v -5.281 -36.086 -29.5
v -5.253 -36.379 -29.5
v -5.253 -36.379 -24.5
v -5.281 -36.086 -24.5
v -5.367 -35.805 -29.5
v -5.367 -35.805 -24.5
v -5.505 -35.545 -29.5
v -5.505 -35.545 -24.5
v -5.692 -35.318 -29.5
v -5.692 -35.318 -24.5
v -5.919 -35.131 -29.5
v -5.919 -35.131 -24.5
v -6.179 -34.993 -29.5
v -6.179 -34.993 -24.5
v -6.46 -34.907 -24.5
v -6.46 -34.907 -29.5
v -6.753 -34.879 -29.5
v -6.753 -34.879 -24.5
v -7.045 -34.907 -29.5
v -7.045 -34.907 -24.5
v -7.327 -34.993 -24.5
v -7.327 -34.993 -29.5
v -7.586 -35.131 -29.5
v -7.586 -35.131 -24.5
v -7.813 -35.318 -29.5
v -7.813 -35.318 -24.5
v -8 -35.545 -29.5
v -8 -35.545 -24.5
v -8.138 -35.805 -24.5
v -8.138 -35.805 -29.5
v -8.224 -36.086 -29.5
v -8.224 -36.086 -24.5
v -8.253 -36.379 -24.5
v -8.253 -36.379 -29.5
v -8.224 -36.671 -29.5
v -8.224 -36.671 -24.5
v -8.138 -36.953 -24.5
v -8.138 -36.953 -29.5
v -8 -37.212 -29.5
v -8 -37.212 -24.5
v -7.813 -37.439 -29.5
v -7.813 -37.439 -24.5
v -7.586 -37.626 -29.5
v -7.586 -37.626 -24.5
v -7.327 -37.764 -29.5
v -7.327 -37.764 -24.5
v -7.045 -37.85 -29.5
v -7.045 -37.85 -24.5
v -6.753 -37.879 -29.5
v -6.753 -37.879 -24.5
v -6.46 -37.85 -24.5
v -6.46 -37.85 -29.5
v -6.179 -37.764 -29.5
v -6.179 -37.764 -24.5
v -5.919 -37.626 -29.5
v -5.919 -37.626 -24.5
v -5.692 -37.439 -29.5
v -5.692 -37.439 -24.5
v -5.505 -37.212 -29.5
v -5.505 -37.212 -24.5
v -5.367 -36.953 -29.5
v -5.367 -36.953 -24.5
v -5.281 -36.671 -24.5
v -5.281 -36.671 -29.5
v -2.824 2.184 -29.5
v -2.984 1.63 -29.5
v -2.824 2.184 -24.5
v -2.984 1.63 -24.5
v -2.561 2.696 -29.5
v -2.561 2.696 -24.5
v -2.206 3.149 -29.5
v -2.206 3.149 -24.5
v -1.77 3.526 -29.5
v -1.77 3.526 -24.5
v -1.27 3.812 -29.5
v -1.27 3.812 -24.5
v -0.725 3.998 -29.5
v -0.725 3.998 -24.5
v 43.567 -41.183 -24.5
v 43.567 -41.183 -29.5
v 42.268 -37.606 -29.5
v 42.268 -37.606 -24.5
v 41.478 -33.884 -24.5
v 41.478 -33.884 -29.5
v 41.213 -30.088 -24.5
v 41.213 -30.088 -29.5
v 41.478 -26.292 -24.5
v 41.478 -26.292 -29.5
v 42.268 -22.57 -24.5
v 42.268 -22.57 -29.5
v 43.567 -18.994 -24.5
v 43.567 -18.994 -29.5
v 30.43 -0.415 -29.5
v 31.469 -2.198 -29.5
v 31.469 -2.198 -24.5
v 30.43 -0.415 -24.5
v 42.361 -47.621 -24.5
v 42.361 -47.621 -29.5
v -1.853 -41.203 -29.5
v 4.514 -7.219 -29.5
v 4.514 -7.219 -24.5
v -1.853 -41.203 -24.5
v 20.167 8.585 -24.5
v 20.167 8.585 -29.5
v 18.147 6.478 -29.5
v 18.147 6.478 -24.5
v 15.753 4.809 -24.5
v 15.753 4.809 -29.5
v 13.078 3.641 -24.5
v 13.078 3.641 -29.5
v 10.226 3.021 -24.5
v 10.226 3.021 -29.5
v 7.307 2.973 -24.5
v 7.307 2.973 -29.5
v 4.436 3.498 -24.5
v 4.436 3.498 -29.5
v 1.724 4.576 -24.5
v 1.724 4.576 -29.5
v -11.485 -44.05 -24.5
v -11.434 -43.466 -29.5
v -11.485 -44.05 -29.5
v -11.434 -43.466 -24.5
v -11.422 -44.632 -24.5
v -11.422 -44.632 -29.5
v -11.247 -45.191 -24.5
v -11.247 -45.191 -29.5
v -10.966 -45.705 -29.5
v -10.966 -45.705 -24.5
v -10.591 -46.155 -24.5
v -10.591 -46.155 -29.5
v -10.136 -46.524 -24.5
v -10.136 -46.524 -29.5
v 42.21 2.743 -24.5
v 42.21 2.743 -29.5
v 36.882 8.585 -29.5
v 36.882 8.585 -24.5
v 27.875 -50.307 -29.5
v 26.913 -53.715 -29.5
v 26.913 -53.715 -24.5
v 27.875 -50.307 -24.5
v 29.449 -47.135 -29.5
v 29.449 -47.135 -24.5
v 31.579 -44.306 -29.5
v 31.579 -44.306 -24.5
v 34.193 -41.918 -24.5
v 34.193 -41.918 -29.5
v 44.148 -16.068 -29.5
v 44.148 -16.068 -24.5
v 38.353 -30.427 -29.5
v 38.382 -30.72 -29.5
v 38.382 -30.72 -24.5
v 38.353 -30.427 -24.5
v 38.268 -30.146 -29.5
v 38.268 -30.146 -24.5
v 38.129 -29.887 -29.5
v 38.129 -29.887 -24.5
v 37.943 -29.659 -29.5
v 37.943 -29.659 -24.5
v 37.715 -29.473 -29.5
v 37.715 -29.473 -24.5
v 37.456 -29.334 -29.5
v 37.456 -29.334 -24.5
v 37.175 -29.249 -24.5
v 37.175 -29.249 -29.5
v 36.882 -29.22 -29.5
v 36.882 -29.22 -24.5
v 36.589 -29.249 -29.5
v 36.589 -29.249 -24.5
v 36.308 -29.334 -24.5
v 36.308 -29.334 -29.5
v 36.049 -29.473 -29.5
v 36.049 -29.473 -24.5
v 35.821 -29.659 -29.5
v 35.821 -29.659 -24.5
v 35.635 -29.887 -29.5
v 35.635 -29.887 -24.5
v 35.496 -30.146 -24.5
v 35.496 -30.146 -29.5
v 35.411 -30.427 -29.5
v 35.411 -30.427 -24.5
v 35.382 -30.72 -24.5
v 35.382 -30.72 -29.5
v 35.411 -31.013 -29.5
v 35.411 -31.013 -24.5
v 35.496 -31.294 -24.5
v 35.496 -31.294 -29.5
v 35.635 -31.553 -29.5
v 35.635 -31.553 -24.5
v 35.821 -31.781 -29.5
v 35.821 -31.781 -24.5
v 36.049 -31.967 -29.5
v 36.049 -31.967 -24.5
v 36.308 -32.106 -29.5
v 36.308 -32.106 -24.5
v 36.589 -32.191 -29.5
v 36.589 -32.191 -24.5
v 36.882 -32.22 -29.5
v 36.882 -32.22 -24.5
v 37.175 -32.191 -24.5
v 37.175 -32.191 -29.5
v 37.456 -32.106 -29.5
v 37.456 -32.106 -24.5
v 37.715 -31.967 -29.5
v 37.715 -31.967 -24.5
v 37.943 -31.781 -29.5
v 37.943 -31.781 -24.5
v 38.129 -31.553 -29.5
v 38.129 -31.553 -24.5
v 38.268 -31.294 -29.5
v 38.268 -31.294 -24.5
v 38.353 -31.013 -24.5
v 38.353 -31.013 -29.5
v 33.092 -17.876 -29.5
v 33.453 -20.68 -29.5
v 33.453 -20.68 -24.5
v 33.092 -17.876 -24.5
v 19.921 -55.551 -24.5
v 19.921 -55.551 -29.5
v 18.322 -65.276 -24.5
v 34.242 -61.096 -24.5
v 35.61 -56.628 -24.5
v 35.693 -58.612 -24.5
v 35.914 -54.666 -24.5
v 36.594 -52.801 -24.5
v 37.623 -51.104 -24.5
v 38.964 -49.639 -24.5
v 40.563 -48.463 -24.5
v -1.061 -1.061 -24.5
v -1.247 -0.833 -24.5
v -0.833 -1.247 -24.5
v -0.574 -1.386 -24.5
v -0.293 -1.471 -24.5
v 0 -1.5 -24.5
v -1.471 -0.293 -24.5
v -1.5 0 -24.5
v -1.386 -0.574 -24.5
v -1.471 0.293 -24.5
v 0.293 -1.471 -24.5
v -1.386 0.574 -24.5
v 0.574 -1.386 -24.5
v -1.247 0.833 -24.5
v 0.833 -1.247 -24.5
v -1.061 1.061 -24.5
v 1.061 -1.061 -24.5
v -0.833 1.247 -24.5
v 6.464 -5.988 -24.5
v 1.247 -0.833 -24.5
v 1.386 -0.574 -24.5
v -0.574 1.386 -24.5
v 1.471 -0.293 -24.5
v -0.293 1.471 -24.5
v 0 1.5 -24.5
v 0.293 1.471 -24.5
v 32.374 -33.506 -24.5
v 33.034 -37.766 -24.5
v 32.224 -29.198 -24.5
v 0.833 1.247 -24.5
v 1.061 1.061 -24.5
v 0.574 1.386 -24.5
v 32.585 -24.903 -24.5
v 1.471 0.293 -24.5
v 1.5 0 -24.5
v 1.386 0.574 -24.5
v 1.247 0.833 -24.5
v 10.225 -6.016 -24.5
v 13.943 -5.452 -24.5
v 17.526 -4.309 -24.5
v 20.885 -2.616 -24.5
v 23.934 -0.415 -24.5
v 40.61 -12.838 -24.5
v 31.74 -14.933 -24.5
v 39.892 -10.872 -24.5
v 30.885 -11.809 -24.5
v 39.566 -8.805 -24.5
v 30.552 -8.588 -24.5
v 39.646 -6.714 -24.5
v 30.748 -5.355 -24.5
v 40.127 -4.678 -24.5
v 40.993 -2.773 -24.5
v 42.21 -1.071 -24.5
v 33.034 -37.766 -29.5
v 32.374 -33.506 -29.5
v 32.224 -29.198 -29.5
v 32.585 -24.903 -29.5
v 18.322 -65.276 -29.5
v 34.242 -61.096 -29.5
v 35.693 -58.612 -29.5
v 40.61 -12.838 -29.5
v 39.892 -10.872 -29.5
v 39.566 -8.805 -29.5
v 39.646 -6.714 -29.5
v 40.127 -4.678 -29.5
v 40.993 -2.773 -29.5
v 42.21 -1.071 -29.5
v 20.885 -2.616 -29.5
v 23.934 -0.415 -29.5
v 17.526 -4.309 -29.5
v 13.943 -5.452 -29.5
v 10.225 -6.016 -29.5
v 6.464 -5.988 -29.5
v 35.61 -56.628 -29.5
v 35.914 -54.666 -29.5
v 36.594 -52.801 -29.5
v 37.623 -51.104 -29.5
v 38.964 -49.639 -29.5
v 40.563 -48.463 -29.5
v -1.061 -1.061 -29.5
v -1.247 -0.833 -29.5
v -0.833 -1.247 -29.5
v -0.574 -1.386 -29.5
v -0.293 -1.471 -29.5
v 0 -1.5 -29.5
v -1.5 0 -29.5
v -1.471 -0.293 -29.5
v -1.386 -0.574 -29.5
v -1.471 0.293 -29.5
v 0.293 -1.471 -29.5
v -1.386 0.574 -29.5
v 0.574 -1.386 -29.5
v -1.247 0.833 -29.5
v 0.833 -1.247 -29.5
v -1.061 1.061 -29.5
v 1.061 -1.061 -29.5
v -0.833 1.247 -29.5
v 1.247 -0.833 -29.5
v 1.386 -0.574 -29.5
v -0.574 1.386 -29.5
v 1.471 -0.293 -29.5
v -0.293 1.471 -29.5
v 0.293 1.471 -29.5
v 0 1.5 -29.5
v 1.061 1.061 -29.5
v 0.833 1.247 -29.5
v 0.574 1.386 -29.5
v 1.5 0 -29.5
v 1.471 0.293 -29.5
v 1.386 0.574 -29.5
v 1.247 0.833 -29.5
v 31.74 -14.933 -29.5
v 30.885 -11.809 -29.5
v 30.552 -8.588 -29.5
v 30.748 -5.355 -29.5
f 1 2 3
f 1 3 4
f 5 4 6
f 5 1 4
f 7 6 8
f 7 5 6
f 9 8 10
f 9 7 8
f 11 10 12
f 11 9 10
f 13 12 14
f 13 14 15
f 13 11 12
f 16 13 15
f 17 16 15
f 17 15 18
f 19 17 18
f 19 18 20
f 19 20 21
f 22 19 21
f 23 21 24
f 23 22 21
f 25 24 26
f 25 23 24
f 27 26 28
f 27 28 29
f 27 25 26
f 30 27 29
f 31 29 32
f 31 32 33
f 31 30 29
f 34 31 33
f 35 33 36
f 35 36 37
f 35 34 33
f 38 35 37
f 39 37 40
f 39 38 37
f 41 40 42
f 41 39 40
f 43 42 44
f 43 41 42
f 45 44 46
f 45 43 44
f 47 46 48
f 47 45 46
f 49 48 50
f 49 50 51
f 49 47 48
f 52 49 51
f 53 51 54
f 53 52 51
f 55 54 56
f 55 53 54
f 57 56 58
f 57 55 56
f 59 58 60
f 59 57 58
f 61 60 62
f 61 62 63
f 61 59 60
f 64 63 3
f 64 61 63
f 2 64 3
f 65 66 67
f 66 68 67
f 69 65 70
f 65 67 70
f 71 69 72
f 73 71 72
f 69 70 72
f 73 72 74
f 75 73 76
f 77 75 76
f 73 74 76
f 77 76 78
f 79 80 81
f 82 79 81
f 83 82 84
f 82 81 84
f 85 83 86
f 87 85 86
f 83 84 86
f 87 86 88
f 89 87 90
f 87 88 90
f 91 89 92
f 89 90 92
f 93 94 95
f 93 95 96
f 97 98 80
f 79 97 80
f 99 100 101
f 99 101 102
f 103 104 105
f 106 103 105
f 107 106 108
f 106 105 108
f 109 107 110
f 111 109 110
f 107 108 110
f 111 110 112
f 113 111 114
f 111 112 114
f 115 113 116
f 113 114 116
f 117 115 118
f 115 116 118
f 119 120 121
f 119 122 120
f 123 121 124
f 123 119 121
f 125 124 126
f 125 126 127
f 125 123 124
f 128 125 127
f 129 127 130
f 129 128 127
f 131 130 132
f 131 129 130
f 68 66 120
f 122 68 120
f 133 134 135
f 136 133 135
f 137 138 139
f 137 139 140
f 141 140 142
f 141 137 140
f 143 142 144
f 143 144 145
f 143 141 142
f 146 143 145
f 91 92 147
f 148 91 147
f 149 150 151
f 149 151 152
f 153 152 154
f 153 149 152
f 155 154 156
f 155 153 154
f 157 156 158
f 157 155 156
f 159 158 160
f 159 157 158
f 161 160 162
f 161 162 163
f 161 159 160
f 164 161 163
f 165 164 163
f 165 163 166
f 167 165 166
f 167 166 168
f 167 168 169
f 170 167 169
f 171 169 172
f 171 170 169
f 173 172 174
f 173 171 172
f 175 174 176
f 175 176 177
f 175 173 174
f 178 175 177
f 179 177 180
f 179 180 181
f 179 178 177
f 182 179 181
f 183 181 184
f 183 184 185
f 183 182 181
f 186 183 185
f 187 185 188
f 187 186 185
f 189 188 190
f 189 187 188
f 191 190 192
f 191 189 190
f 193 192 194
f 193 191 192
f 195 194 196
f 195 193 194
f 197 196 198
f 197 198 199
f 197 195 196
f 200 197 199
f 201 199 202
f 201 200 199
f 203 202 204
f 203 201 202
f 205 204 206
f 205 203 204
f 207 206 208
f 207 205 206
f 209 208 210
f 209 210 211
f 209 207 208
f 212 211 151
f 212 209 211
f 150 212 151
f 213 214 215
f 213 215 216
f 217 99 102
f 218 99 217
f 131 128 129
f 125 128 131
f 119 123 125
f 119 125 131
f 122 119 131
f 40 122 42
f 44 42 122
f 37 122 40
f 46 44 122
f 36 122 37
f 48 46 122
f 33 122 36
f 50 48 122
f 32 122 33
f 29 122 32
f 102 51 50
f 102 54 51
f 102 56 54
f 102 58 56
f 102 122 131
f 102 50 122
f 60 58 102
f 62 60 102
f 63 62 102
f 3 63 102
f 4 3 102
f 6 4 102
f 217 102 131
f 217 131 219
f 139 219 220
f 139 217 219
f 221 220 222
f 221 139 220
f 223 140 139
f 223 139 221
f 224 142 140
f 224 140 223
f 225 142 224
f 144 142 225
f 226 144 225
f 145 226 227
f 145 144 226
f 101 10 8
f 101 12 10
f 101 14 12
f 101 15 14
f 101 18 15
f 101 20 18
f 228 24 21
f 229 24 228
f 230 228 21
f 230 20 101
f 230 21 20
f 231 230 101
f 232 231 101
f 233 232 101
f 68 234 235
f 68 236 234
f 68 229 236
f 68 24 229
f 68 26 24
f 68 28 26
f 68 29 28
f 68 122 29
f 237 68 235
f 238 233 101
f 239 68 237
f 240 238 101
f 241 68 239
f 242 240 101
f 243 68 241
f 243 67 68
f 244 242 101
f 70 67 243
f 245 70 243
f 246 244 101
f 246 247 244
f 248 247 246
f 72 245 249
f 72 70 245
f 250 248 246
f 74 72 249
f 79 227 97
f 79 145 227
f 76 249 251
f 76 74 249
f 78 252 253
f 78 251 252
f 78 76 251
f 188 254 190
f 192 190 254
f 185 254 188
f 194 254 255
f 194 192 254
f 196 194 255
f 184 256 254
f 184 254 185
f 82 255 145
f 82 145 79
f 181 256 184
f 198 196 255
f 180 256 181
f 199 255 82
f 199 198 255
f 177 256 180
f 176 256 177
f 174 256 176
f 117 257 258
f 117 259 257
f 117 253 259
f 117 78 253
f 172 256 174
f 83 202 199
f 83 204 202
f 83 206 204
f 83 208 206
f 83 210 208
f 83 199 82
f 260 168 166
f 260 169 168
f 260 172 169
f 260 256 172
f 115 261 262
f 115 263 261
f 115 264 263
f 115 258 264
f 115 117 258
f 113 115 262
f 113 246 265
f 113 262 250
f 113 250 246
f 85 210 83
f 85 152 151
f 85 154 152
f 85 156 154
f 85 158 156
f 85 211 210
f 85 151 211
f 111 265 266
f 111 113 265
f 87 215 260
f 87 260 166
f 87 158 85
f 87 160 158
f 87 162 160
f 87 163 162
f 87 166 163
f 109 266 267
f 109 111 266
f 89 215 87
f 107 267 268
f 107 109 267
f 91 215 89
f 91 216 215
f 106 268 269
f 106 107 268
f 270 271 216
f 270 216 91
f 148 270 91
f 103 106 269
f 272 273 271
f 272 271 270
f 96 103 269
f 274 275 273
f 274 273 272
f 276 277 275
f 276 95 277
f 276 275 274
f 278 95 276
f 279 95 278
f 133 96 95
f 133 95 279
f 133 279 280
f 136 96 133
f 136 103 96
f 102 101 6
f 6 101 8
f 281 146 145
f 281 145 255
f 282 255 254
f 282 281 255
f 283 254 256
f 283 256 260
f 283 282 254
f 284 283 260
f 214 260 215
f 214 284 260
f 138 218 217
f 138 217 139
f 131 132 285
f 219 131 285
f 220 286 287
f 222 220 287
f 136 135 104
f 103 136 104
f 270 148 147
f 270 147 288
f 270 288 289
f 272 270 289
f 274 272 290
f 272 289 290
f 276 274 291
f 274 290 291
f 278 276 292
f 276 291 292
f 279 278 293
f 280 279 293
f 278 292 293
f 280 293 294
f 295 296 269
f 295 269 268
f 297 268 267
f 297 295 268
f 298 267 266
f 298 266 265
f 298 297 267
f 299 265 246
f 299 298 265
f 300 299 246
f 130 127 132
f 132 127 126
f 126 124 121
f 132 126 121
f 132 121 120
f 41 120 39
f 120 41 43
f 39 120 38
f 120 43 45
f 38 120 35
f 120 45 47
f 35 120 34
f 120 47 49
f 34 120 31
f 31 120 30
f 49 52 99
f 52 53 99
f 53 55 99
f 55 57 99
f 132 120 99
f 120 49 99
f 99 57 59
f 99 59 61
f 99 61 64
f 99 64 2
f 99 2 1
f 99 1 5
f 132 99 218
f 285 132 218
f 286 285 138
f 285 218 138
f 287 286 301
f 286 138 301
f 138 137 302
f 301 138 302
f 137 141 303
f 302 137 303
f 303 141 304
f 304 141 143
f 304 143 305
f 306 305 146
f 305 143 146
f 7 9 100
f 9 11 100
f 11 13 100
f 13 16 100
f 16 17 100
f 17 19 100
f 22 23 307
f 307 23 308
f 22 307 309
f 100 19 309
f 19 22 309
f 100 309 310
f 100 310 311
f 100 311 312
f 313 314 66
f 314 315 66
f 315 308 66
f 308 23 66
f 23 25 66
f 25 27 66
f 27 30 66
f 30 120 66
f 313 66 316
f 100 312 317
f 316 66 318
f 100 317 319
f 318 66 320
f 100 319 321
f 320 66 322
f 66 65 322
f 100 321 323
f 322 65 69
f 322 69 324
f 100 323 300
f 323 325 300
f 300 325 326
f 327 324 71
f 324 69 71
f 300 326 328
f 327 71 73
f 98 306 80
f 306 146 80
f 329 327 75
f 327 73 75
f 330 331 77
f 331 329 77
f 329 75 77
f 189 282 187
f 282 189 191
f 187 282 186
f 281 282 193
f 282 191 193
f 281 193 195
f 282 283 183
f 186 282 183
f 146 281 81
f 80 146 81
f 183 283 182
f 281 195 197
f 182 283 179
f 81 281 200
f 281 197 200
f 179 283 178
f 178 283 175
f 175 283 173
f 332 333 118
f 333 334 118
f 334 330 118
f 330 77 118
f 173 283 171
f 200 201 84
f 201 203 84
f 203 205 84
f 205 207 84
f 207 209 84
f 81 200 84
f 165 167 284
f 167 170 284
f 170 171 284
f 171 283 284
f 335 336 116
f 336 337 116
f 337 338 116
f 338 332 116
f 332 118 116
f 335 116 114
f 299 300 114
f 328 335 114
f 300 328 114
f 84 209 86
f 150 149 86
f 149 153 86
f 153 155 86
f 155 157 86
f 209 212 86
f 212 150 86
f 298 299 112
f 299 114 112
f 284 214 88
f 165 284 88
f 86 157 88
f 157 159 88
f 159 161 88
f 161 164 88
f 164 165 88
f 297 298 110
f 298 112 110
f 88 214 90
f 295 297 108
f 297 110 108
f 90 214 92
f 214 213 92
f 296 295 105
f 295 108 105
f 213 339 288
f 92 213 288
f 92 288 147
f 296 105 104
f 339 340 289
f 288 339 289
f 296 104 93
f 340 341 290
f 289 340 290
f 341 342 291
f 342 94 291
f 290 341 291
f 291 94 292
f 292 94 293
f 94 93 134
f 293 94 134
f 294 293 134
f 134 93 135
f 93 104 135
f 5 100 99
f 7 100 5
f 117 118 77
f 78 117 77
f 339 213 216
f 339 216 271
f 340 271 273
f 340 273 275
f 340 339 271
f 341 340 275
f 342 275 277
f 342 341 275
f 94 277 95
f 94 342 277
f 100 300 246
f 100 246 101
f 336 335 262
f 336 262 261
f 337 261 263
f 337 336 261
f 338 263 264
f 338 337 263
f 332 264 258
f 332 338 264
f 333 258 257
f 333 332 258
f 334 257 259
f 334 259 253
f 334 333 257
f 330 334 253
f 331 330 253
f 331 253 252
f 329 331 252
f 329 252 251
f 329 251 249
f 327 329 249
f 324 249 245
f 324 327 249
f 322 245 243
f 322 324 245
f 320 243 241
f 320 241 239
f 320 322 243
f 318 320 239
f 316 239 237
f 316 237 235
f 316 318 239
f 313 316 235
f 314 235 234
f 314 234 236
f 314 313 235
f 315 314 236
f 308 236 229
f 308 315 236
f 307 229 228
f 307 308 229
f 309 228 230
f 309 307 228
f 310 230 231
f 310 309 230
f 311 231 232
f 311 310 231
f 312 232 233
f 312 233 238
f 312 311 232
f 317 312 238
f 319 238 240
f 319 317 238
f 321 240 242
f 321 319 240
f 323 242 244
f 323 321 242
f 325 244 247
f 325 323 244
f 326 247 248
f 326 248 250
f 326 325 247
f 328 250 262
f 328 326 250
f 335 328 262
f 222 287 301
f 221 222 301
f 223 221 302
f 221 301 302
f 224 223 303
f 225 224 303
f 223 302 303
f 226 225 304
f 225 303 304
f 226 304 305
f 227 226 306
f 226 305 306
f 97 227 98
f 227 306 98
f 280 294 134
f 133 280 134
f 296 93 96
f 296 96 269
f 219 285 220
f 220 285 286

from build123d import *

# Parameters (mm, degrees)
SKETCH2_R           = 1.5
BOSS_EXTRUDE1_DEPTH = 5
FILLET1_R           = 3
CHAMFER3_SIZE       = 2


with BuildPart() as part:
    # Sketch2 → Boss-Extrude1 (new body)
    with BuildSketch(Plane.XY.offset(-29.5)):
        with BuildLine():
            Line((-2.624619354, 3.548914368), (-11.801237054, -45.426295313))
            Line((-11.801237054, -45.426295313), (18.322008005, -65.275718381))
            Line((18.322008005, -65.275718381), (36.176514182, -60.587663687))
            ThreePointArc((36.176514182, -60.587663687), (36.583090059, -52.82338526), (42.360756545, -47.620703893))
            Line((42.360756545, -47.620703893), (43.567071105, -41.182655532))
            ThreePointArc((43.567071105, -41.182655532), (41.213039161, -30.088151018), (43.567071105, -18.993646503))
            Line((43.567071105, -18.993646503), (44.148406248, -16.06786198))
            Line((44.148406248, -16.06786198), (40.610484334, -12.837581299))
            ThreePointArc((40.610484334, -12.837581299), (39.645613087, -6.714468603), (42.210497415, -1.071344115))
            Line((42.210497415, -1.071344115), (42.210497415, 2.742539662))
            Line((42.210497415, 2.742539662), (36.882012848, 8.585085022))
            Line((36.882012848, 8.585085022), (20.167337536, 8.585085022))
            ThreePointArc((20.167337536, 8.585085022), (11.667192324, 3.260597998), (1.723711062, 4.575820826))
            Line((1.723711062, 4.575820826), (-2.624619354, 3.548914368))
        make_face()
        Circle(SKETCH2_R, mode=Mode.SUBTRACT)
        with Locations((36.882012848, -30.719979302)):
            Circle(SKETCH2_R, mode=Mode.SUBTRACT)
        with Locations((-6.752606997, -36.378596712)):
            Circle(SKETCH2_R, mode=Mode.SUBTRACT)
        with BuildLine():
            Line((-1.853309264, -41.203149553), (19.920649662, -55.5508907))
            Line((19.920649662, -55.5508907), (26.912648631, -53.715002702))
            ThreePointArc((26.912648631, -53.715002702), (29.448505151, -47.134631862), (34.193378933, -41.917542493))
            ThreePointArc((34.193378933, -41.917542493), (32.235117961, -31.354391616), (33.452553096, -20.680461028))
            Line((33.452553096, -20.680461028), (33.092400062, -17.875614172))
            ThreePointArc((33.092400062, -17.875614172), (30.652450166, -10.205517854), (31.469259091, -2.198236405))
            Line((31.469259091, -2.198236405), (30.430492401, -0.414914978))
            Line((30.430492401, -0.414914978), (23.934260151, -0.414914978))
            ThreePointArc((23.934260151, -0.414914978), (15.757383222, -4.951165755), (6.464186316, -5.988170424))
            Line((6.464186316, -5.988170424), (4.514445223, -7.21872072))
            Line((4.514445223, -7.21872072), (-1.853309264, -41.203149553))
        make_face(mode=Mode.SUBTRACT)
    extrude(amount=BOSS_EXTRUDE1_DEPTH)

    # Fillet1
    fillet1_edges = [part.edges().sort_by_distance(p)[0] for p in [
        (-11.801237054, -45.426295313, -27),
        (-2.624619354, 3.548914368, -27),
    ]]
    fillet(fillet1_edges, radius=FILLET1_R)

    # Chamfer3
    # the kernel refuses this chamfer: 2, 1.851821387 mm, written as the material it takes off along each edge
    with BuildSketch(Plane(origin=(36.176514182, -60.587663687, -34.731164248), x_dir=(-0.9672143762553561, -0.25396131667039873, 0), z_dir=(0, 0, 1))) as chamfer3_piece_1:
        with BuildLine():
            Line((CHAMFER3_SIZE, 0), (-0.03393884, -2.03393884))
            ThreePointArc((-0.03393884, -2.03393884), (0.03354605, -1.046793416), (0, 0))
            Line((0, 0), (CHAMFER3_SIZE, 0))
        make_face()
    extrude(amount=15.462328496, mode=Mode.SUBTRACT)


solid = part.part
